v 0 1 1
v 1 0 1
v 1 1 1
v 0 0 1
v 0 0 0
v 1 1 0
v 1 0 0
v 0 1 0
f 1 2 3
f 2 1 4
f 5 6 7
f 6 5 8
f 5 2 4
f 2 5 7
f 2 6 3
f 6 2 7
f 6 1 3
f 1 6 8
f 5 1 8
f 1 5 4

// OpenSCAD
// a NUL and control bytes in a comment: 
label = "tab	here";
cube(1);
